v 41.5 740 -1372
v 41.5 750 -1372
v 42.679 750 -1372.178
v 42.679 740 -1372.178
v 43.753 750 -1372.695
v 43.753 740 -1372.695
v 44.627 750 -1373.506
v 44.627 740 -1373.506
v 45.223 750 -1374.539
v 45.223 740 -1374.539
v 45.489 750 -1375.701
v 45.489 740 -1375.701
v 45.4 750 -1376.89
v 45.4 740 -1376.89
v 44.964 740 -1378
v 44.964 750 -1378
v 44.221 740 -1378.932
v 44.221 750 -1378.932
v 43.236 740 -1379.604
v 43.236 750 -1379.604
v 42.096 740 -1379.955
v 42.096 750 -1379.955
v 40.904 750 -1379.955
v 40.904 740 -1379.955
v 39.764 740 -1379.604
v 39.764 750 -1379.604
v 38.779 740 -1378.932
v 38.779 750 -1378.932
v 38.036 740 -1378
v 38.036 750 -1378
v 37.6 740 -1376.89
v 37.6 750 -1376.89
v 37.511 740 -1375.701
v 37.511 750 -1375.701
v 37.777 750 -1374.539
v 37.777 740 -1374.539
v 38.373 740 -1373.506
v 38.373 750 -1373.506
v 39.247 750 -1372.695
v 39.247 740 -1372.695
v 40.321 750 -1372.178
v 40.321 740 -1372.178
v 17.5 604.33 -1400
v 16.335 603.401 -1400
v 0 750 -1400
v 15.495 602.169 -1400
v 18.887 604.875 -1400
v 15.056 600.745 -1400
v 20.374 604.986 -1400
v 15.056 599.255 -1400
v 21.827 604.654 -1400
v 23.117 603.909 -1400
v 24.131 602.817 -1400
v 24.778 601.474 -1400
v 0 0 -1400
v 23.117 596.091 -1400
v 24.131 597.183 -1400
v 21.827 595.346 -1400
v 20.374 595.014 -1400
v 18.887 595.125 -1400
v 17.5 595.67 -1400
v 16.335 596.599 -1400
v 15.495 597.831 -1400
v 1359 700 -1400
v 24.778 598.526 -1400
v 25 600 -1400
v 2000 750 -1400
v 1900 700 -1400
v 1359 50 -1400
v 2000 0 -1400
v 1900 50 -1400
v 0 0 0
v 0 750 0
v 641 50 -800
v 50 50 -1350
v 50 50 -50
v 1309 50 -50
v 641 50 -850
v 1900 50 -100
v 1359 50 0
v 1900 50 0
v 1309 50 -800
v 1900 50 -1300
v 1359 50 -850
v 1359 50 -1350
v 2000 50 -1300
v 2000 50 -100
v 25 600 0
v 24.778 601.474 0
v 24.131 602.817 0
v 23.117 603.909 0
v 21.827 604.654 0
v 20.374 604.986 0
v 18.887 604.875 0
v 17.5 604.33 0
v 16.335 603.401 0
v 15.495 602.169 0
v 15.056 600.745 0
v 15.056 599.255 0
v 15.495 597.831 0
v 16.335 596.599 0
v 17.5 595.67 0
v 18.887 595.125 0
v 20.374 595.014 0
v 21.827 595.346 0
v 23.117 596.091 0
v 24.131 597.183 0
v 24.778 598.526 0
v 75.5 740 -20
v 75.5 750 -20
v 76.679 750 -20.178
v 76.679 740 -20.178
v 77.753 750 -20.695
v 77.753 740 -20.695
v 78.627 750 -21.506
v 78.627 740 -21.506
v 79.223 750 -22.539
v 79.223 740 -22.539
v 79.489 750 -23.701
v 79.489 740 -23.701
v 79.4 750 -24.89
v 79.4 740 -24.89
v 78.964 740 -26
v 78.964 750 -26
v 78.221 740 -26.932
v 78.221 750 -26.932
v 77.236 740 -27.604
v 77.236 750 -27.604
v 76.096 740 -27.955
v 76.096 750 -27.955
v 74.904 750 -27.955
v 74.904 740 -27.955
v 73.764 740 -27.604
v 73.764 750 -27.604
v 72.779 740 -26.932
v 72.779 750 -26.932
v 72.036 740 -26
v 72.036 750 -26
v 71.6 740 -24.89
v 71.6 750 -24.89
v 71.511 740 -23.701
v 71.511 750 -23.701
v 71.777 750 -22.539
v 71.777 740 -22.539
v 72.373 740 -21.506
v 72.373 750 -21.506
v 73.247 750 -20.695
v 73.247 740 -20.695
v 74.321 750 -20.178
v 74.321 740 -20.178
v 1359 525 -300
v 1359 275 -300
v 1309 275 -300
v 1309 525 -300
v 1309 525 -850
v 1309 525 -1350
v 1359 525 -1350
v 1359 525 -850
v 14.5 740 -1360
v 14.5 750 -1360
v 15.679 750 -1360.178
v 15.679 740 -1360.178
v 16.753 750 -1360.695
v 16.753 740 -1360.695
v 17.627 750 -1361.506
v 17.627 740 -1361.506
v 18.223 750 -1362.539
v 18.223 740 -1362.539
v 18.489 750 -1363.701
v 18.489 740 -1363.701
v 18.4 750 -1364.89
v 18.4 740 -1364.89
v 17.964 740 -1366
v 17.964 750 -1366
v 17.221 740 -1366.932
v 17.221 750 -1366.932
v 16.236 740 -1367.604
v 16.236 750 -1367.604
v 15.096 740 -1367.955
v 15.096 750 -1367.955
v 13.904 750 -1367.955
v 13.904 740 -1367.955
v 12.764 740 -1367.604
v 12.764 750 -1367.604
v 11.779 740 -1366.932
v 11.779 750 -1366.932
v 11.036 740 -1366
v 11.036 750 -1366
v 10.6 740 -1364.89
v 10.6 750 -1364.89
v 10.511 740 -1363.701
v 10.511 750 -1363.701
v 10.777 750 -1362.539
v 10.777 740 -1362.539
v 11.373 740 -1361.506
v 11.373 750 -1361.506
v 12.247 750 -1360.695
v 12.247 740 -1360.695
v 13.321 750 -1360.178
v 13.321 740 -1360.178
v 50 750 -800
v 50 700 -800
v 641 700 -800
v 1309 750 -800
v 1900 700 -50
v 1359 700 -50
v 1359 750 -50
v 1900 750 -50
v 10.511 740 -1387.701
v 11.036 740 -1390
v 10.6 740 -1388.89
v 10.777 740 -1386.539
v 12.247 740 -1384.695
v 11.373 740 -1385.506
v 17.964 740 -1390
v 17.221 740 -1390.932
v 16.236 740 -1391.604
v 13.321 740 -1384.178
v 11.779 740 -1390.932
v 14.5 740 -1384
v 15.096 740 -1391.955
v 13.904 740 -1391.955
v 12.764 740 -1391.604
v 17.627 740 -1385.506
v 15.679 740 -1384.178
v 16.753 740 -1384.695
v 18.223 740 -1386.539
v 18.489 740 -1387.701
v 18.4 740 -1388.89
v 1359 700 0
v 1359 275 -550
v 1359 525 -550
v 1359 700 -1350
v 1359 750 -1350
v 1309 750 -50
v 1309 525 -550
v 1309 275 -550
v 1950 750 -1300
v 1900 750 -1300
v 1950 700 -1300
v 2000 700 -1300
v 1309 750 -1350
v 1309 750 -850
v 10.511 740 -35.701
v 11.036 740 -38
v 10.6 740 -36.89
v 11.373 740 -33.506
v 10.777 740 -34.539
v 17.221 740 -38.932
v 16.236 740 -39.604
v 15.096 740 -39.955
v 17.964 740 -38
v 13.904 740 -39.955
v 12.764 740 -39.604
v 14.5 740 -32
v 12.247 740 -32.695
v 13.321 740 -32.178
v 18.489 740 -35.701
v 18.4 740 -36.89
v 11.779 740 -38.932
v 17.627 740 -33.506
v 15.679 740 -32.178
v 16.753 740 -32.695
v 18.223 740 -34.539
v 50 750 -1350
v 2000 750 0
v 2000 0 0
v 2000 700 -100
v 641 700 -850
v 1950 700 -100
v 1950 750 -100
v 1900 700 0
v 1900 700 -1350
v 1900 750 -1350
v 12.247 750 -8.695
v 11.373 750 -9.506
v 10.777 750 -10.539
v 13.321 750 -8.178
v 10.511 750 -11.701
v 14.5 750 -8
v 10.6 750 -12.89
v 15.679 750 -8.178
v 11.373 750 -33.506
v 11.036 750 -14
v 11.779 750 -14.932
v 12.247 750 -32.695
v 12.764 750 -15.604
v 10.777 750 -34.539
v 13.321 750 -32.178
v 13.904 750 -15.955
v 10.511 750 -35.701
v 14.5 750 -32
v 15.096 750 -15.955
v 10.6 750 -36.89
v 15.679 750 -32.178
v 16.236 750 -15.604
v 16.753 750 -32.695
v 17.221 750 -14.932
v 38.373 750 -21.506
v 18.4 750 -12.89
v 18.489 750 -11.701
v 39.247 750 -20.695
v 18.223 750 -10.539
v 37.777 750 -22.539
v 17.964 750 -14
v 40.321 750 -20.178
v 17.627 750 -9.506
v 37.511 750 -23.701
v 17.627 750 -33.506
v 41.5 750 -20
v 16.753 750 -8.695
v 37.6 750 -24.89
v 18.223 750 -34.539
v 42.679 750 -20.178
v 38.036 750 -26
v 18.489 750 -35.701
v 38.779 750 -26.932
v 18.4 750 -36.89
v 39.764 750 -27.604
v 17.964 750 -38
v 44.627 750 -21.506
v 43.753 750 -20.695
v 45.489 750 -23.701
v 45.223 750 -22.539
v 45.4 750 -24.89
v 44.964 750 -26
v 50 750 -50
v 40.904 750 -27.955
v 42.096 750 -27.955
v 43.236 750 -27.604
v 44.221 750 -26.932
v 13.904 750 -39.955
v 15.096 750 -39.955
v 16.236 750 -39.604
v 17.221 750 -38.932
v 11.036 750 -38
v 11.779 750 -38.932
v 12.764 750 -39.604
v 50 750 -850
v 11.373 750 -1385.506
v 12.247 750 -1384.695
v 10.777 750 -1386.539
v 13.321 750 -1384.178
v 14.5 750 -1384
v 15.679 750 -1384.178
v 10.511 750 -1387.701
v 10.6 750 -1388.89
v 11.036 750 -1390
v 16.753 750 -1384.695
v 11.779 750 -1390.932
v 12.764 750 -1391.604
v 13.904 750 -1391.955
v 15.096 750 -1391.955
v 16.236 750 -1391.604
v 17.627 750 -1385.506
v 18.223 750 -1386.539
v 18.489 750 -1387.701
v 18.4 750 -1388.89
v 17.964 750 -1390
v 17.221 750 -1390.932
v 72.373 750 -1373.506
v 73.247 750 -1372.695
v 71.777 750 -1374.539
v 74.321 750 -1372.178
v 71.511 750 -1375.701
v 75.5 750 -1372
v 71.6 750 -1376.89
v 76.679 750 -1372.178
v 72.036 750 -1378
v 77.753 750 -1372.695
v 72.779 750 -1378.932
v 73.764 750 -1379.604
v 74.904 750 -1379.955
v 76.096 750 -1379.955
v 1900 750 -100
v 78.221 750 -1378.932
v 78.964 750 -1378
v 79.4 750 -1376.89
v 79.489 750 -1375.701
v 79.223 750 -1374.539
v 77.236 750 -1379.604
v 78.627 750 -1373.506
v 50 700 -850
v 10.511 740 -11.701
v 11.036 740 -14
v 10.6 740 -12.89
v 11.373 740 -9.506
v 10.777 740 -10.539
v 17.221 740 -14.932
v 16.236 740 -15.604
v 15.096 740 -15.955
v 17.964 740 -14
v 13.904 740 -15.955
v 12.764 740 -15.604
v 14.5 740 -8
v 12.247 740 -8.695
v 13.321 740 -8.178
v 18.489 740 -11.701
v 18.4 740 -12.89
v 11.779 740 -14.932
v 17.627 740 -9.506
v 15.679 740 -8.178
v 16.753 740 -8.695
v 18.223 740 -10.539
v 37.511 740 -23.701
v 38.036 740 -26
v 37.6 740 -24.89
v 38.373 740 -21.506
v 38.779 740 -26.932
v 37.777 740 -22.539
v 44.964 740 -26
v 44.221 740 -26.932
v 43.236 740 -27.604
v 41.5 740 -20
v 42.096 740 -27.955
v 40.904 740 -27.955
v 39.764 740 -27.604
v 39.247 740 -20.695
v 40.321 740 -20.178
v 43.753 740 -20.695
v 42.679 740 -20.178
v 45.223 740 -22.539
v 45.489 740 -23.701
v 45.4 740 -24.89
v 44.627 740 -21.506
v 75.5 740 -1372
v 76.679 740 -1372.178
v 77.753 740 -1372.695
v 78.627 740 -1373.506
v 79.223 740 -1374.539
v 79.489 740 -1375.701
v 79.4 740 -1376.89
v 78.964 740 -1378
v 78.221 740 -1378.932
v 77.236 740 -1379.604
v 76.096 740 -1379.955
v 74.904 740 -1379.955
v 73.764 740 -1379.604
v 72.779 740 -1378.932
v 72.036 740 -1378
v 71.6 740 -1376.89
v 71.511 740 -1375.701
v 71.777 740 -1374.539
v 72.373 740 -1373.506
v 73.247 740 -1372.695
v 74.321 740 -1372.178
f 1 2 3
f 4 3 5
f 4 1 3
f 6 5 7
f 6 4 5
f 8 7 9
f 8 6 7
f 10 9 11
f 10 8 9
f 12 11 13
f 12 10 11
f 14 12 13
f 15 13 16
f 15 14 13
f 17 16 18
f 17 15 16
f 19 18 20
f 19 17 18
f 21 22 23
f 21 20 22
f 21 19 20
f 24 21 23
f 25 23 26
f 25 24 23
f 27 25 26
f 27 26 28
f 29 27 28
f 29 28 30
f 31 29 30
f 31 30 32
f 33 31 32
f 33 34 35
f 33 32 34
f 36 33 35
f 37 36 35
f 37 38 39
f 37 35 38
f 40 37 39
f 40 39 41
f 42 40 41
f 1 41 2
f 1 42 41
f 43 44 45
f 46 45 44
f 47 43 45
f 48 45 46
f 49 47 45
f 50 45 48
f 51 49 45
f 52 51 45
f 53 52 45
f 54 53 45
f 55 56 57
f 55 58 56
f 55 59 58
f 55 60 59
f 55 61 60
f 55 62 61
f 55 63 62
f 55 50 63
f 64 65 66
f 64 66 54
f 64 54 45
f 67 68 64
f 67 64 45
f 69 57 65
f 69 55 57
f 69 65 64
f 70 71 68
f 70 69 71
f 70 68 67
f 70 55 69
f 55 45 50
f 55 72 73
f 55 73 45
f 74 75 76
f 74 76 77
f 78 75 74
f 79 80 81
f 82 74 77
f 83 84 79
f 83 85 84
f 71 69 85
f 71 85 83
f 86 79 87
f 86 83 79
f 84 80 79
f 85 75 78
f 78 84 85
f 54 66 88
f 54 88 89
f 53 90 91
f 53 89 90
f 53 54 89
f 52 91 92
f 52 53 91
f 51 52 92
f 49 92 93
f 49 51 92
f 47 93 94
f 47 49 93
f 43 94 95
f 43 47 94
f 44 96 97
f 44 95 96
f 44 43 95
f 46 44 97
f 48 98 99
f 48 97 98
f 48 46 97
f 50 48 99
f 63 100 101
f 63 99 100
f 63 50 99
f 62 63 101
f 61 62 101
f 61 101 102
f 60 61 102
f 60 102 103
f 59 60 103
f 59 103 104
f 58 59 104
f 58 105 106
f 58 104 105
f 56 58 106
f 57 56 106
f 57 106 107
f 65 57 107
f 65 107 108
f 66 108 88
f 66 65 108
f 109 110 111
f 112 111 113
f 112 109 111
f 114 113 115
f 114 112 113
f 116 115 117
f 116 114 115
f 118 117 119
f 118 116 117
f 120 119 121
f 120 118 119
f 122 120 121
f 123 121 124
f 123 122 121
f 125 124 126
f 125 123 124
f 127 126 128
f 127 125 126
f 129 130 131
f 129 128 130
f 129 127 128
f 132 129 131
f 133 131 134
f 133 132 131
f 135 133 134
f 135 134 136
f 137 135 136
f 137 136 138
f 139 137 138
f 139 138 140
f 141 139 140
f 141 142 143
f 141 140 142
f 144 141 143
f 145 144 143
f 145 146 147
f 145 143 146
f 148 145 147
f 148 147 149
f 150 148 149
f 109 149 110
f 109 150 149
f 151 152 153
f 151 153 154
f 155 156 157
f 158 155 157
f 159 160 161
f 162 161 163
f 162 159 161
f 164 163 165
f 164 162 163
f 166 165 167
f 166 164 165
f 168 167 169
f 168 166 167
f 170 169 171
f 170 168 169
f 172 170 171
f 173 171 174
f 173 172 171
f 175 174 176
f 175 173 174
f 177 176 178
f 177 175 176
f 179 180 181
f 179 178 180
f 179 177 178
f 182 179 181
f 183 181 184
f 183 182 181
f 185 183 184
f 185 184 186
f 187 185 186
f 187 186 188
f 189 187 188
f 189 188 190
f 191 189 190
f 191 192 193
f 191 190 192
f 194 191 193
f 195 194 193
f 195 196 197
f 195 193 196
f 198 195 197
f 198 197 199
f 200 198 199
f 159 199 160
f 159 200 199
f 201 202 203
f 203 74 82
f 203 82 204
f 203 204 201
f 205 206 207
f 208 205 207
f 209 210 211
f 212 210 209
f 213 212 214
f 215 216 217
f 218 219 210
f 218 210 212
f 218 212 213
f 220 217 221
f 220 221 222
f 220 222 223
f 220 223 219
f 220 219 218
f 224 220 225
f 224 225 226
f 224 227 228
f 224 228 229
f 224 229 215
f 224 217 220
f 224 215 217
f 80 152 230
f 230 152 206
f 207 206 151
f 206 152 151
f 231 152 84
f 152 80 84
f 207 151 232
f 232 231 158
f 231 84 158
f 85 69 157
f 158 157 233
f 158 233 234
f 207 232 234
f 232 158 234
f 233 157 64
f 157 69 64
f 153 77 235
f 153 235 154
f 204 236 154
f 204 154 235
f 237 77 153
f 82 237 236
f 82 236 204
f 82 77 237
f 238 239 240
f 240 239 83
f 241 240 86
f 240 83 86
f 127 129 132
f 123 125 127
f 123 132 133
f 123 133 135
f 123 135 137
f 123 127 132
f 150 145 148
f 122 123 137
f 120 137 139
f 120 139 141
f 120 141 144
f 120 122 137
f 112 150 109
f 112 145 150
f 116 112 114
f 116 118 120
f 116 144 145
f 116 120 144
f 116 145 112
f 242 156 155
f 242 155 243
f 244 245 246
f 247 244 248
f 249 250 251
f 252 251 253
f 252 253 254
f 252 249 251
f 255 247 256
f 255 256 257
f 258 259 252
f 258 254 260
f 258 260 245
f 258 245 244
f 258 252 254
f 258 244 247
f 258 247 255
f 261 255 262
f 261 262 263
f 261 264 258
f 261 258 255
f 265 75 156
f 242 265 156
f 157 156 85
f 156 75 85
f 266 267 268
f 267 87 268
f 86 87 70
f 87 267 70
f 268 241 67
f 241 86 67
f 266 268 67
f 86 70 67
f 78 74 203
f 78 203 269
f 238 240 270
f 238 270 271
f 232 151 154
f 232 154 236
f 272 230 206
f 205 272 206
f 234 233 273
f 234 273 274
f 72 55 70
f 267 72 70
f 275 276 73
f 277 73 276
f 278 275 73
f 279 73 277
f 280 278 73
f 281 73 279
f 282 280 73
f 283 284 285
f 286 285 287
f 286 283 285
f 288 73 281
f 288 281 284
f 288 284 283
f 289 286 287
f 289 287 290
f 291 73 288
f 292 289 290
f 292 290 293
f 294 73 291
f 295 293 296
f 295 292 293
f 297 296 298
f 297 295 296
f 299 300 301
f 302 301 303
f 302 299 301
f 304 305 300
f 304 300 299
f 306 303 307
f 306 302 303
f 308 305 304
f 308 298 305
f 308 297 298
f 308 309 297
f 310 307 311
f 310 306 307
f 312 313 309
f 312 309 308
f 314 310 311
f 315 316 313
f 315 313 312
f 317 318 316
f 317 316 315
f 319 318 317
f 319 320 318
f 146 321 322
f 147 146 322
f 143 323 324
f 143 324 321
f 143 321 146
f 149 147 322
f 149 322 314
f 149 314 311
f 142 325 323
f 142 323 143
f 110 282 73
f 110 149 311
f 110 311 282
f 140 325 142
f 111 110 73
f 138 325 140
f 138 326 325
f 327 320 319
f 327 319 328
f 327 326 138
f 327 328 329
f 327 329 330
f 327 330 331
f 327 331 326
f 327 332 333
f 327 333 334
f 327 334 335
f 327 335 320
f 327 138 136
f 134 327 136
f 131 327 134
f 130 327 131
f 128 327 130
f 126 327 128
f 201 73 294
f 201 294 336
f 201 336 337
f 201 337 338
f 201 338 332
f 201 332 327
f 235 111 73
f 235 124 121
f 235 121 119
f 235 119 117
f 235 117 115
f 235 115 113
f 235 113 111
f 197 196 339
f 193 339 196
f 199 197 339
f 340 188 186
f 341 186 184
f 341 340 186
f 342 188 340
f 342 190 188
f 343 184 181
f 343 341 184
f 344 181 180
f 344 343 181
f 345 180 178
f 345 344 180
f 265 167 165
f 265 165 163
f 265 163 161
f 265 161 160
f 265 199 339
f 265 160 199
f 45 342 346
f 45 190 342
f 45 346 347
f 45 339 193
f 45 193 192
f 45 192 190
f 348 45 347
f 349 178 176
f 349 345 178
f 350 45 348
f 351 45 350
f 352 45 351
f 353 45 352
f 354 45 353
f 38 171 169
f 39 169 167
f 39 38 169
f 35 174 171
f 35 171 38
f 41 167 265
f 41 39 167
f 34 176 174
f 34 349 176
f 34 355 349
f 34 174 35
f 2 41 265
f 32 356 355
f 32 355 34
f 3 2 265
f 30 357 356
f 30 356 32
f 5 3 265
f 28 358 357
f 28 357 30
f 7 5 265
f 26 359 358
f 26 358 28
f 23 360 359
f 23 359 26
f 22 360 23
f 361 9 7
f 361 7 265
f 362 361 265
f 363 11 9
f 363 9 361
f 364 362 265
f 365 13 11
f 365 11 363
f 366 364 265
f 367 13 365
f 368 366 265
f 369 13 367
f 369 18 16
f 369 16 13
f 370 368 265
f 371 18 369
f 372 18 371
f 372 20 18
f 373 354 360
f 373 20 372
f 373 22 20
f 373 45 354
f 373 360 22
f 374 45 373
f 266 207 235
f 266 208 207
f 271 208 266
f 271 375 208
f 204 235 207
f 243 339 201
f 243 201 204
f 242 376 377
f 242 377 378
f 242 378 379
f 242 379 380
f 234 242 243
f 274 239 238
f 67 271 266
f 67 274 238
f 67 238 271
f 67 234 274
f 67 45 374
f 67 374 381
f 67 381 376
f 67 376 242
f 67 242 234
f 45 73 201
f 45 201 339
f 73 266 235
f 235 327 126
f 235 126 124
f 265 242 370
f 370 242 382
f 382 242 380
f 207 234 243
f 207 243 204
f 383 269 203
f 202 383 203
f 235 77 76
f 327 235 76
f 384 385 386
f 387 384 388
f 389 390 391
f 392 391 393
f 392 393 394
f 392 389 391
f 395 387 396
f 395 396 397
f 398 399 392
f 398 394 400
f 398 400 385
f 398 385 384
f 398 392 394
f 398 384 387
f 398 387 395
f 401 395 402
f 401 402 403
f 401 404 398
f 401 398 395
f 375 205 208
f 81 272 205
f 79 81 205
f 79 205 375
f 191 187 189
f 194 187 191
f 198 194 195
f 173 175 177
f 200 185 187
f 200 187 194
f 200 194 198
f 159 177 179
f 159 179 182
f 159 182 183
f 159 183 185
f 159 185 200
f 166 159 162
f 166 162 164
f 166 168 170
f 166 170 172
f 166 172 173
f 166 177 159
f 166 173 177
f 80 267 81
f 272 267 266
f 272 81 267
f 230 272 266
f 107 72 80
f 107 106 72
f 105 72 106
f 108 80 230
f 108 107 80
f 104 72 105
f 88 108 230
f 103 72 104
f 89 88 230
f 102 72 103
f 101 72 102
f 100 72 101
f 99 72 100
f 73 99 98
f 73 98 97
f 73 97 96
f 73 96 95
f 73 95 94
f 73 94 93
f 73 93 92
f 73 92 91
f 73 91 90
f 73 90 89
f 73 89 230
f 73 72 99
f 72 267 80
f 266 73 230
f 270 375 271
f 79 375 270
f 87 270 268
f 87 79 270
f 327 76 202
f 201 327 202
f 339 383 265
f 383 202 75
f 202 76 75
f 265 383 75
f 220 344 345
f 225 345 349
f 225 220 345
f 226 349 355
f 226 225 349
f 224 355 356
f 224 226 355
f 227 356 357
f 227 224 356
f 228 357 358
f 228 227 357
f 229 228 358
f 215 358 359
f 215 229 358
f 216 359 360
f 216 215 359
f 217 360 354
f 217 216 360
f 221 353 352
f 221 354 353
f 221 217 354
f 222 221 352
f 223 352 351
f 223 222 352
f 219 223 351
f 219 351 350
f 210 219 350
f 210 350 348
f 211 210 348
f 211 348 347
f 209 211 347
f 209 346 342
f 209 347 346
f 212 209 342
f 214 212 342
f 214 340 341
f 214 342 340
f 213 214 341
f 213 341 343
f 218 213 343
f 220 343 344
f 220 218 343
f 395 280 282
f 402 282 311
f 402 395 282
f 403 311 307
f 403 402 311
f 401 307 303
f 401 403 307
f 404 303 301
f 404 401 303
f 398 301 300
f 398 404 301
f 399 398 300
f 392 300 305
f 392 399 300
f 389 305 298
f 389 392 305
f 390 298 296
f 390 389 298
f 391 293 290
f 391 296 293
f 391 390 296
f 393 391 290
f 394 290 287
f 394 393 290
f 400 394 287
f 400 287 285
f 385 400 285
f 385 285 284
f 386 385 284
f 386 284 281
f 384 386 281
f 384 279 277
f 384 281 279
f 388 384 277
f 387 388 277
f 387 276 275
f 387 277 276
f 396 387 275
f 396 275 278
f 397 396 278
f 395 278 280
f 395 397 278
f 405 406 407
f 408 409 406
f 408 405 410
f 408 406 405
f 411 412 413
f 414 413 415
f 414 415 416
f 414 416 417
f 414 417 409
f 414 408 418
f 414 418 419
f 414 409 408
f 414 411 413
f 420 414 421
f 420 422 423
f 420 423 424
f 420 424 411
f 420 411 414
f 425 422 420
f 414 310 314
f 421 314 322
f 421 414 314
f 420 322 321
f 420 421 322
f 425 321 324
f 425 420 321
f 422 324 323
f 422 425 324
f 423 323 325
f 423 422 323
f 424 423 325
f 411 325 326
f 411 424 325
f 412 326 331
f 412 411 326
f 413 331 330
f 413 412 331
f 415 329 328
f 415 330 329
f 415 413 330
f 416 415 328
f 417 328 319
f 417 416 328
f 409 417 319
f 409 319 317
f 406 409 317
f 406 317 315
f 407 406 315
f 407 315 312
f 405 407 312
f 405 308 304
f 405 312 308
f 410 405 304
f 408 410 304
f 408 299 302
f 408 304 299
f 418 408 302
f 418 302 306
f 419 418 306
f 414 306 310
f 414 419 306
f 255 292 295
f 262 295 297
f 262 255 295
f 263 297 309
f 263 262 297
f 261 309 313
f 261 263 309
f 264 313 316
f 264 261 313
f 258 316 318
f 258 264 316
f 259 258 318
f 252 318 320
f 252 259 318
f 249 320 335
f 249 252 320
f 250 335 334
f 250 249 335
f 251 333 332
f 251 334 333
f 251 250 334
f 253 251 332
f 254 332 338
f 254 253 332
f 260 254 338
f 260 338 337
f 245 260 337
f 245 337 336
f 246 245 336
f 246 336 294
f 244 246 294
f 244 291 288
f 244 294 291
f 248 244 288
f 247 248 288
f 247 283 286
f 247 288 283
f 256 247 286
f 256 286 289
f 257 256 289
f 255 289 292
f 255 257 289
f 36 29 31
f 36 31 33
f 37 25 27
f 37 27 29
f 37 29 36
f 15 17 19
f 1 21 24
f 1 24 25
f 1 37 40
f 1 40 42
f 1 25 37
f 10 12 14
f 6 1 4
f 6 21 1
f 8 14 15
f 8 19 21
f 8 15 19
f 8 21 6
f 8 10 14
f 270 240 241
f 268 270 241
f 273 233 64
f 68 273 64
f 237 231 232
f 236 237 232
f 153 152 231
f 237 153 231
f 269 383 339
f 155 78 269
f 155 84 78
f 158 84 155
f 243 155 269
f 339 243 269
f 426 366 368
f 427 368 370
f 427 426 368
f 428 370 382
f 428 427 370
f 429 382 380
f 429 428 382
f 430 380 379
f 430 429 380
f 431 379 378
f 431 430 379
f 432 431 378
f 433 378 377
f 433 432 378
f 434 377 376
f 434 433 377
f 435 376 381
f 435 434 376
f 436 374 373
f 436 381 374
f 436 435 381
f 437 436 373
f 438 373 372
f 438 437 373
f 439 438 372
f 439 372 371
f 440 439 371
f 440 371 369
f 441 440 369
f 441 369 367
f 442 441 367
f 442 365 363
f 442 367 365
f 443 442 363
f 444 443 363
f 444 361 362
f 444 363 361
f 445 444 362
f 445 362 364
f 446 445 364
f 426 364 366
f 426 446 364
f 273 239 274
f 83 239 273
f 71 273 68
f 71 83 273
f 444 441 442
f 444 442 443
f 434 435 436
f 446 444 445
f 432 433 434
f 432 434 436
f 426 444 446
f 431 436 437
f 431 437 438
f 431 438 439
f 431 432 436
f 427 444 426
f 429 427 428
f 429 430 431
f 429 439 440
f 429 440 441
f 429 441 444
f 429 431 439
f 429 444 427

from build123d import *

# Parameters (mm, degrees)
SKETCH1_W               = 2000
SKETCH1_H               = 1400
BOSS_EXTRUDE1_DEPTH     = 50
SKETCH2_W               = 100
SKETCH2_H               = 100
SKETCH2_W_2             = 50
SKETCH2_H_2             = 1300
SKETCH2_W_3             = 718
SKETCH2_H_3             = 50
BOSS_EXTRUDE2_DEPTH     = 700
SKETCH3_W               = 50
SKETCH3_H               = 50
BOSS_EXTRUDE3_DEPTH     = 591
SKETCH4_W               = 50
SKETCH4_H               = 750
BOSS_EXTRUDE4_DEPTH     = 700
SKETCH5_W               = 250
SKETCH5_H               = 250
CUT_EXTRUDE1_DEPTH      = 700
SKETCH6_W               = 50
SKETCH6_H               = 225
BOSS_EXTRUDE5_DEPTH     = 500
SKETCH8_W               = 50
SKETCH8_H               = 50
BOSS_EXTRUDE6_DEPTH     = 541
SKETCH9_W               = 50
SKETCH9_H               = 50
BOSS_EXTRUDE7_DEPTH     = 1200
CUT_EXTRUDE3_DEPTH      = 2554.918557824
CUT_EXTRUDE3_DEPTH_BACK = 2554.918557824
SKETCH11_R              = 5
CUT_EXTRUDE4_DEPTH      = 2554.918557824
CUT_EXTRUDE4_DEPTH_BACK = 10
SKETCH12_R              = 4


with BuildPart() as part:
    # Sketch1 → Boss-Extrude1 (new body)
    with BuildSketch(Plane(origin=(0, 0, 0), x_dir=(1, 0, 0), z_dir=(0, 1, 0))):
        with Locations((1000, 700)):
            Rectangle(SKETCH1_W, SKETCH1_H)
    extrude(amount=BOSS_EXTRUDE1_DEPTH)

    # Sketch2 → Boss-Extrude2 (add)
    with BuildSketch(Plane(origin=(0, 50, 0), x_dir=(1, 0, 0), z_dir=(0, 1, 0))):
        with Locations((1950, 1350)):
            Rectangle(SKETCH2_W, SKETCH2_H)
        with Locations((1950, 50)):
            Rectangle(SKETCH2_W, SKETCH2_H)
        Polygon((0, 1400), (0, 1350), (50, 1350), (1359, 1350), (1359, 1400), align=None)
        with Locations((25, 700)):
            Rectangle(SKETCH2_W_2, SKETCH2_H_2)
        Polygon((50, 50), (0, 50), (0, 0), (1359, 0), (1359, 50), align=None)
        with Locations((1000, 825)):
            Rectangle(SKETCH2_W_3, SKETCH2_H_3)
    extrude(amount=BOSS_EXTRUDE2_DEPTH)

    # Sketch3 → Boss-Extrude3 (add)
    with BuildSketch(Plane.ZY.offset(-641)):
        with Locations((-825, 725)):
            Rectangle(SKETCH3_W, SKETCH3_H)
    extrude(amount=BOSS_EXTRUDE3_DEPTH)

    # Sketch4 → Boss-Extrude4 (add)
    with BuildSketch(Plane(origin=(0, 50, 0), x_dir=(1, 0, 0), z_dir=(0, 1, 0))):
        with Locations((1334, 425)):
            Rectangle(SKETCH4_W, SKETCH4_H)
    extrude(amount=BOSS_EXTRUDE4_DEPTH)

    # Sketch5 → Cut-Extrude1 (cut)
    with BuildSketch(Plane(origin=(1359, 0, 0), x_dir=(0, 0, -1), z_dir=(1, 0, 0))):
        with Locations((425, 400)):
            Rectangle(SKETCH5_W, SKETCH5_H)
    extrude(amount=-CUT_EXTRUDE1_DEPTH, mode=Mode.SUBTRACT)

    # Sketch6 → Boss-Extrude5 (add)
    with BuildSketch(Plane.XY.offset(-1350)):
        with Locations((1334, 637.5)):
            Rectangle(SKETCH6_W, SKETCH6_H)
    extrude(amount=BOSS_EXTRUDE5_DEPTH)

    # Sketch8 → Boss-Extrude6 (add)
    with BuildSketch(Plane(origin=(1359, 0, 0), x_dir=(0, 0, -1), z_dir=(1, 0, 0))):
        with Locations((25, 725)):
            Rectangle(SKETCH8_W, SKETCH8_H)
        with Locations((1375, 725)):
            Rectangle(SKETCH8_W, SKETCH8_H)
    extrude(amount=BOSS_EXTRUDE6_DEPTH)

    # Sketch9 → Boss-Extrude7 (add)
    with BuildSketch(Plane.XY.offset(-1300)):
        with Locations((1975, 725)):
            Rectangle(SKETCH9_W, SKETCH9_H)
    extrude(amount=BOSS_EXTRUDE7_DEPTH)

    # Sketch11 → Cut-Extrude3 (cut, two sides: drawn at the far end of the back side and taken through both)
    with BuildSketch(Plane.XY.offset(-CUT_EXTRUDE3_DEPTH_BACK)):
        with Locations((20, 600)):
            Circle(SKETCH11_R)
    extrude(amount=CUT_EXTRUDE3_DEPTH + CUT_EXTRUDE3_DEPTH_BACK, mode=Mode.SUBTRACT)

    # Sketch12 → Cut-Extrude4 (cut, two sides: drawn at the far end of the back side and taken through both)
    with BuildSketch(Plane(origin=(0, 750, 0), x_dir=(1, 0, 0), z_dir=(0, 1, 0)).offset(-CUT_EXTRUDE4_DEPTH_BACK)):
        with Locations(Location((14.5, 36, 0), (0, 0, 270))):
            Circle(SKETCH12_R)
        with Locations(Location((14.5, 12, 0), (0, 0, 270))):
            Circle(SKETCH12_R)
        with Locations(Location((41.5, 24, 0), (0, 0, 270))):
            Circle(SKETCH12_R)
        with Locations(Location((75.5, 24, 0), (0, 0, 270))):
            Circle(SKETCH12_R)
        with Locations(Location((14.5, 1388, 0), (0, 0, 270))):
            Circle(SKETCH12_R)
        with Locations(Location((14.5, 1364, 0), (0, 0, 270))):
            Circle(SKETCH12_R)
        with Locations(Location((41.5, 1376, 0), (0, 0, 270))):
            Circle(SKETCH12_R)
        with Locations(Location((75.5, 1376, 0), (0, 0, 270))):
            Circle(SKETCH12_R)
    extrude(amount=CUT_EXTRUDE4_DEPTH + CUT_EXTRUDE4_DEPTH_BACK, mode=Mode.SUBTRACT)


solid = part.part
